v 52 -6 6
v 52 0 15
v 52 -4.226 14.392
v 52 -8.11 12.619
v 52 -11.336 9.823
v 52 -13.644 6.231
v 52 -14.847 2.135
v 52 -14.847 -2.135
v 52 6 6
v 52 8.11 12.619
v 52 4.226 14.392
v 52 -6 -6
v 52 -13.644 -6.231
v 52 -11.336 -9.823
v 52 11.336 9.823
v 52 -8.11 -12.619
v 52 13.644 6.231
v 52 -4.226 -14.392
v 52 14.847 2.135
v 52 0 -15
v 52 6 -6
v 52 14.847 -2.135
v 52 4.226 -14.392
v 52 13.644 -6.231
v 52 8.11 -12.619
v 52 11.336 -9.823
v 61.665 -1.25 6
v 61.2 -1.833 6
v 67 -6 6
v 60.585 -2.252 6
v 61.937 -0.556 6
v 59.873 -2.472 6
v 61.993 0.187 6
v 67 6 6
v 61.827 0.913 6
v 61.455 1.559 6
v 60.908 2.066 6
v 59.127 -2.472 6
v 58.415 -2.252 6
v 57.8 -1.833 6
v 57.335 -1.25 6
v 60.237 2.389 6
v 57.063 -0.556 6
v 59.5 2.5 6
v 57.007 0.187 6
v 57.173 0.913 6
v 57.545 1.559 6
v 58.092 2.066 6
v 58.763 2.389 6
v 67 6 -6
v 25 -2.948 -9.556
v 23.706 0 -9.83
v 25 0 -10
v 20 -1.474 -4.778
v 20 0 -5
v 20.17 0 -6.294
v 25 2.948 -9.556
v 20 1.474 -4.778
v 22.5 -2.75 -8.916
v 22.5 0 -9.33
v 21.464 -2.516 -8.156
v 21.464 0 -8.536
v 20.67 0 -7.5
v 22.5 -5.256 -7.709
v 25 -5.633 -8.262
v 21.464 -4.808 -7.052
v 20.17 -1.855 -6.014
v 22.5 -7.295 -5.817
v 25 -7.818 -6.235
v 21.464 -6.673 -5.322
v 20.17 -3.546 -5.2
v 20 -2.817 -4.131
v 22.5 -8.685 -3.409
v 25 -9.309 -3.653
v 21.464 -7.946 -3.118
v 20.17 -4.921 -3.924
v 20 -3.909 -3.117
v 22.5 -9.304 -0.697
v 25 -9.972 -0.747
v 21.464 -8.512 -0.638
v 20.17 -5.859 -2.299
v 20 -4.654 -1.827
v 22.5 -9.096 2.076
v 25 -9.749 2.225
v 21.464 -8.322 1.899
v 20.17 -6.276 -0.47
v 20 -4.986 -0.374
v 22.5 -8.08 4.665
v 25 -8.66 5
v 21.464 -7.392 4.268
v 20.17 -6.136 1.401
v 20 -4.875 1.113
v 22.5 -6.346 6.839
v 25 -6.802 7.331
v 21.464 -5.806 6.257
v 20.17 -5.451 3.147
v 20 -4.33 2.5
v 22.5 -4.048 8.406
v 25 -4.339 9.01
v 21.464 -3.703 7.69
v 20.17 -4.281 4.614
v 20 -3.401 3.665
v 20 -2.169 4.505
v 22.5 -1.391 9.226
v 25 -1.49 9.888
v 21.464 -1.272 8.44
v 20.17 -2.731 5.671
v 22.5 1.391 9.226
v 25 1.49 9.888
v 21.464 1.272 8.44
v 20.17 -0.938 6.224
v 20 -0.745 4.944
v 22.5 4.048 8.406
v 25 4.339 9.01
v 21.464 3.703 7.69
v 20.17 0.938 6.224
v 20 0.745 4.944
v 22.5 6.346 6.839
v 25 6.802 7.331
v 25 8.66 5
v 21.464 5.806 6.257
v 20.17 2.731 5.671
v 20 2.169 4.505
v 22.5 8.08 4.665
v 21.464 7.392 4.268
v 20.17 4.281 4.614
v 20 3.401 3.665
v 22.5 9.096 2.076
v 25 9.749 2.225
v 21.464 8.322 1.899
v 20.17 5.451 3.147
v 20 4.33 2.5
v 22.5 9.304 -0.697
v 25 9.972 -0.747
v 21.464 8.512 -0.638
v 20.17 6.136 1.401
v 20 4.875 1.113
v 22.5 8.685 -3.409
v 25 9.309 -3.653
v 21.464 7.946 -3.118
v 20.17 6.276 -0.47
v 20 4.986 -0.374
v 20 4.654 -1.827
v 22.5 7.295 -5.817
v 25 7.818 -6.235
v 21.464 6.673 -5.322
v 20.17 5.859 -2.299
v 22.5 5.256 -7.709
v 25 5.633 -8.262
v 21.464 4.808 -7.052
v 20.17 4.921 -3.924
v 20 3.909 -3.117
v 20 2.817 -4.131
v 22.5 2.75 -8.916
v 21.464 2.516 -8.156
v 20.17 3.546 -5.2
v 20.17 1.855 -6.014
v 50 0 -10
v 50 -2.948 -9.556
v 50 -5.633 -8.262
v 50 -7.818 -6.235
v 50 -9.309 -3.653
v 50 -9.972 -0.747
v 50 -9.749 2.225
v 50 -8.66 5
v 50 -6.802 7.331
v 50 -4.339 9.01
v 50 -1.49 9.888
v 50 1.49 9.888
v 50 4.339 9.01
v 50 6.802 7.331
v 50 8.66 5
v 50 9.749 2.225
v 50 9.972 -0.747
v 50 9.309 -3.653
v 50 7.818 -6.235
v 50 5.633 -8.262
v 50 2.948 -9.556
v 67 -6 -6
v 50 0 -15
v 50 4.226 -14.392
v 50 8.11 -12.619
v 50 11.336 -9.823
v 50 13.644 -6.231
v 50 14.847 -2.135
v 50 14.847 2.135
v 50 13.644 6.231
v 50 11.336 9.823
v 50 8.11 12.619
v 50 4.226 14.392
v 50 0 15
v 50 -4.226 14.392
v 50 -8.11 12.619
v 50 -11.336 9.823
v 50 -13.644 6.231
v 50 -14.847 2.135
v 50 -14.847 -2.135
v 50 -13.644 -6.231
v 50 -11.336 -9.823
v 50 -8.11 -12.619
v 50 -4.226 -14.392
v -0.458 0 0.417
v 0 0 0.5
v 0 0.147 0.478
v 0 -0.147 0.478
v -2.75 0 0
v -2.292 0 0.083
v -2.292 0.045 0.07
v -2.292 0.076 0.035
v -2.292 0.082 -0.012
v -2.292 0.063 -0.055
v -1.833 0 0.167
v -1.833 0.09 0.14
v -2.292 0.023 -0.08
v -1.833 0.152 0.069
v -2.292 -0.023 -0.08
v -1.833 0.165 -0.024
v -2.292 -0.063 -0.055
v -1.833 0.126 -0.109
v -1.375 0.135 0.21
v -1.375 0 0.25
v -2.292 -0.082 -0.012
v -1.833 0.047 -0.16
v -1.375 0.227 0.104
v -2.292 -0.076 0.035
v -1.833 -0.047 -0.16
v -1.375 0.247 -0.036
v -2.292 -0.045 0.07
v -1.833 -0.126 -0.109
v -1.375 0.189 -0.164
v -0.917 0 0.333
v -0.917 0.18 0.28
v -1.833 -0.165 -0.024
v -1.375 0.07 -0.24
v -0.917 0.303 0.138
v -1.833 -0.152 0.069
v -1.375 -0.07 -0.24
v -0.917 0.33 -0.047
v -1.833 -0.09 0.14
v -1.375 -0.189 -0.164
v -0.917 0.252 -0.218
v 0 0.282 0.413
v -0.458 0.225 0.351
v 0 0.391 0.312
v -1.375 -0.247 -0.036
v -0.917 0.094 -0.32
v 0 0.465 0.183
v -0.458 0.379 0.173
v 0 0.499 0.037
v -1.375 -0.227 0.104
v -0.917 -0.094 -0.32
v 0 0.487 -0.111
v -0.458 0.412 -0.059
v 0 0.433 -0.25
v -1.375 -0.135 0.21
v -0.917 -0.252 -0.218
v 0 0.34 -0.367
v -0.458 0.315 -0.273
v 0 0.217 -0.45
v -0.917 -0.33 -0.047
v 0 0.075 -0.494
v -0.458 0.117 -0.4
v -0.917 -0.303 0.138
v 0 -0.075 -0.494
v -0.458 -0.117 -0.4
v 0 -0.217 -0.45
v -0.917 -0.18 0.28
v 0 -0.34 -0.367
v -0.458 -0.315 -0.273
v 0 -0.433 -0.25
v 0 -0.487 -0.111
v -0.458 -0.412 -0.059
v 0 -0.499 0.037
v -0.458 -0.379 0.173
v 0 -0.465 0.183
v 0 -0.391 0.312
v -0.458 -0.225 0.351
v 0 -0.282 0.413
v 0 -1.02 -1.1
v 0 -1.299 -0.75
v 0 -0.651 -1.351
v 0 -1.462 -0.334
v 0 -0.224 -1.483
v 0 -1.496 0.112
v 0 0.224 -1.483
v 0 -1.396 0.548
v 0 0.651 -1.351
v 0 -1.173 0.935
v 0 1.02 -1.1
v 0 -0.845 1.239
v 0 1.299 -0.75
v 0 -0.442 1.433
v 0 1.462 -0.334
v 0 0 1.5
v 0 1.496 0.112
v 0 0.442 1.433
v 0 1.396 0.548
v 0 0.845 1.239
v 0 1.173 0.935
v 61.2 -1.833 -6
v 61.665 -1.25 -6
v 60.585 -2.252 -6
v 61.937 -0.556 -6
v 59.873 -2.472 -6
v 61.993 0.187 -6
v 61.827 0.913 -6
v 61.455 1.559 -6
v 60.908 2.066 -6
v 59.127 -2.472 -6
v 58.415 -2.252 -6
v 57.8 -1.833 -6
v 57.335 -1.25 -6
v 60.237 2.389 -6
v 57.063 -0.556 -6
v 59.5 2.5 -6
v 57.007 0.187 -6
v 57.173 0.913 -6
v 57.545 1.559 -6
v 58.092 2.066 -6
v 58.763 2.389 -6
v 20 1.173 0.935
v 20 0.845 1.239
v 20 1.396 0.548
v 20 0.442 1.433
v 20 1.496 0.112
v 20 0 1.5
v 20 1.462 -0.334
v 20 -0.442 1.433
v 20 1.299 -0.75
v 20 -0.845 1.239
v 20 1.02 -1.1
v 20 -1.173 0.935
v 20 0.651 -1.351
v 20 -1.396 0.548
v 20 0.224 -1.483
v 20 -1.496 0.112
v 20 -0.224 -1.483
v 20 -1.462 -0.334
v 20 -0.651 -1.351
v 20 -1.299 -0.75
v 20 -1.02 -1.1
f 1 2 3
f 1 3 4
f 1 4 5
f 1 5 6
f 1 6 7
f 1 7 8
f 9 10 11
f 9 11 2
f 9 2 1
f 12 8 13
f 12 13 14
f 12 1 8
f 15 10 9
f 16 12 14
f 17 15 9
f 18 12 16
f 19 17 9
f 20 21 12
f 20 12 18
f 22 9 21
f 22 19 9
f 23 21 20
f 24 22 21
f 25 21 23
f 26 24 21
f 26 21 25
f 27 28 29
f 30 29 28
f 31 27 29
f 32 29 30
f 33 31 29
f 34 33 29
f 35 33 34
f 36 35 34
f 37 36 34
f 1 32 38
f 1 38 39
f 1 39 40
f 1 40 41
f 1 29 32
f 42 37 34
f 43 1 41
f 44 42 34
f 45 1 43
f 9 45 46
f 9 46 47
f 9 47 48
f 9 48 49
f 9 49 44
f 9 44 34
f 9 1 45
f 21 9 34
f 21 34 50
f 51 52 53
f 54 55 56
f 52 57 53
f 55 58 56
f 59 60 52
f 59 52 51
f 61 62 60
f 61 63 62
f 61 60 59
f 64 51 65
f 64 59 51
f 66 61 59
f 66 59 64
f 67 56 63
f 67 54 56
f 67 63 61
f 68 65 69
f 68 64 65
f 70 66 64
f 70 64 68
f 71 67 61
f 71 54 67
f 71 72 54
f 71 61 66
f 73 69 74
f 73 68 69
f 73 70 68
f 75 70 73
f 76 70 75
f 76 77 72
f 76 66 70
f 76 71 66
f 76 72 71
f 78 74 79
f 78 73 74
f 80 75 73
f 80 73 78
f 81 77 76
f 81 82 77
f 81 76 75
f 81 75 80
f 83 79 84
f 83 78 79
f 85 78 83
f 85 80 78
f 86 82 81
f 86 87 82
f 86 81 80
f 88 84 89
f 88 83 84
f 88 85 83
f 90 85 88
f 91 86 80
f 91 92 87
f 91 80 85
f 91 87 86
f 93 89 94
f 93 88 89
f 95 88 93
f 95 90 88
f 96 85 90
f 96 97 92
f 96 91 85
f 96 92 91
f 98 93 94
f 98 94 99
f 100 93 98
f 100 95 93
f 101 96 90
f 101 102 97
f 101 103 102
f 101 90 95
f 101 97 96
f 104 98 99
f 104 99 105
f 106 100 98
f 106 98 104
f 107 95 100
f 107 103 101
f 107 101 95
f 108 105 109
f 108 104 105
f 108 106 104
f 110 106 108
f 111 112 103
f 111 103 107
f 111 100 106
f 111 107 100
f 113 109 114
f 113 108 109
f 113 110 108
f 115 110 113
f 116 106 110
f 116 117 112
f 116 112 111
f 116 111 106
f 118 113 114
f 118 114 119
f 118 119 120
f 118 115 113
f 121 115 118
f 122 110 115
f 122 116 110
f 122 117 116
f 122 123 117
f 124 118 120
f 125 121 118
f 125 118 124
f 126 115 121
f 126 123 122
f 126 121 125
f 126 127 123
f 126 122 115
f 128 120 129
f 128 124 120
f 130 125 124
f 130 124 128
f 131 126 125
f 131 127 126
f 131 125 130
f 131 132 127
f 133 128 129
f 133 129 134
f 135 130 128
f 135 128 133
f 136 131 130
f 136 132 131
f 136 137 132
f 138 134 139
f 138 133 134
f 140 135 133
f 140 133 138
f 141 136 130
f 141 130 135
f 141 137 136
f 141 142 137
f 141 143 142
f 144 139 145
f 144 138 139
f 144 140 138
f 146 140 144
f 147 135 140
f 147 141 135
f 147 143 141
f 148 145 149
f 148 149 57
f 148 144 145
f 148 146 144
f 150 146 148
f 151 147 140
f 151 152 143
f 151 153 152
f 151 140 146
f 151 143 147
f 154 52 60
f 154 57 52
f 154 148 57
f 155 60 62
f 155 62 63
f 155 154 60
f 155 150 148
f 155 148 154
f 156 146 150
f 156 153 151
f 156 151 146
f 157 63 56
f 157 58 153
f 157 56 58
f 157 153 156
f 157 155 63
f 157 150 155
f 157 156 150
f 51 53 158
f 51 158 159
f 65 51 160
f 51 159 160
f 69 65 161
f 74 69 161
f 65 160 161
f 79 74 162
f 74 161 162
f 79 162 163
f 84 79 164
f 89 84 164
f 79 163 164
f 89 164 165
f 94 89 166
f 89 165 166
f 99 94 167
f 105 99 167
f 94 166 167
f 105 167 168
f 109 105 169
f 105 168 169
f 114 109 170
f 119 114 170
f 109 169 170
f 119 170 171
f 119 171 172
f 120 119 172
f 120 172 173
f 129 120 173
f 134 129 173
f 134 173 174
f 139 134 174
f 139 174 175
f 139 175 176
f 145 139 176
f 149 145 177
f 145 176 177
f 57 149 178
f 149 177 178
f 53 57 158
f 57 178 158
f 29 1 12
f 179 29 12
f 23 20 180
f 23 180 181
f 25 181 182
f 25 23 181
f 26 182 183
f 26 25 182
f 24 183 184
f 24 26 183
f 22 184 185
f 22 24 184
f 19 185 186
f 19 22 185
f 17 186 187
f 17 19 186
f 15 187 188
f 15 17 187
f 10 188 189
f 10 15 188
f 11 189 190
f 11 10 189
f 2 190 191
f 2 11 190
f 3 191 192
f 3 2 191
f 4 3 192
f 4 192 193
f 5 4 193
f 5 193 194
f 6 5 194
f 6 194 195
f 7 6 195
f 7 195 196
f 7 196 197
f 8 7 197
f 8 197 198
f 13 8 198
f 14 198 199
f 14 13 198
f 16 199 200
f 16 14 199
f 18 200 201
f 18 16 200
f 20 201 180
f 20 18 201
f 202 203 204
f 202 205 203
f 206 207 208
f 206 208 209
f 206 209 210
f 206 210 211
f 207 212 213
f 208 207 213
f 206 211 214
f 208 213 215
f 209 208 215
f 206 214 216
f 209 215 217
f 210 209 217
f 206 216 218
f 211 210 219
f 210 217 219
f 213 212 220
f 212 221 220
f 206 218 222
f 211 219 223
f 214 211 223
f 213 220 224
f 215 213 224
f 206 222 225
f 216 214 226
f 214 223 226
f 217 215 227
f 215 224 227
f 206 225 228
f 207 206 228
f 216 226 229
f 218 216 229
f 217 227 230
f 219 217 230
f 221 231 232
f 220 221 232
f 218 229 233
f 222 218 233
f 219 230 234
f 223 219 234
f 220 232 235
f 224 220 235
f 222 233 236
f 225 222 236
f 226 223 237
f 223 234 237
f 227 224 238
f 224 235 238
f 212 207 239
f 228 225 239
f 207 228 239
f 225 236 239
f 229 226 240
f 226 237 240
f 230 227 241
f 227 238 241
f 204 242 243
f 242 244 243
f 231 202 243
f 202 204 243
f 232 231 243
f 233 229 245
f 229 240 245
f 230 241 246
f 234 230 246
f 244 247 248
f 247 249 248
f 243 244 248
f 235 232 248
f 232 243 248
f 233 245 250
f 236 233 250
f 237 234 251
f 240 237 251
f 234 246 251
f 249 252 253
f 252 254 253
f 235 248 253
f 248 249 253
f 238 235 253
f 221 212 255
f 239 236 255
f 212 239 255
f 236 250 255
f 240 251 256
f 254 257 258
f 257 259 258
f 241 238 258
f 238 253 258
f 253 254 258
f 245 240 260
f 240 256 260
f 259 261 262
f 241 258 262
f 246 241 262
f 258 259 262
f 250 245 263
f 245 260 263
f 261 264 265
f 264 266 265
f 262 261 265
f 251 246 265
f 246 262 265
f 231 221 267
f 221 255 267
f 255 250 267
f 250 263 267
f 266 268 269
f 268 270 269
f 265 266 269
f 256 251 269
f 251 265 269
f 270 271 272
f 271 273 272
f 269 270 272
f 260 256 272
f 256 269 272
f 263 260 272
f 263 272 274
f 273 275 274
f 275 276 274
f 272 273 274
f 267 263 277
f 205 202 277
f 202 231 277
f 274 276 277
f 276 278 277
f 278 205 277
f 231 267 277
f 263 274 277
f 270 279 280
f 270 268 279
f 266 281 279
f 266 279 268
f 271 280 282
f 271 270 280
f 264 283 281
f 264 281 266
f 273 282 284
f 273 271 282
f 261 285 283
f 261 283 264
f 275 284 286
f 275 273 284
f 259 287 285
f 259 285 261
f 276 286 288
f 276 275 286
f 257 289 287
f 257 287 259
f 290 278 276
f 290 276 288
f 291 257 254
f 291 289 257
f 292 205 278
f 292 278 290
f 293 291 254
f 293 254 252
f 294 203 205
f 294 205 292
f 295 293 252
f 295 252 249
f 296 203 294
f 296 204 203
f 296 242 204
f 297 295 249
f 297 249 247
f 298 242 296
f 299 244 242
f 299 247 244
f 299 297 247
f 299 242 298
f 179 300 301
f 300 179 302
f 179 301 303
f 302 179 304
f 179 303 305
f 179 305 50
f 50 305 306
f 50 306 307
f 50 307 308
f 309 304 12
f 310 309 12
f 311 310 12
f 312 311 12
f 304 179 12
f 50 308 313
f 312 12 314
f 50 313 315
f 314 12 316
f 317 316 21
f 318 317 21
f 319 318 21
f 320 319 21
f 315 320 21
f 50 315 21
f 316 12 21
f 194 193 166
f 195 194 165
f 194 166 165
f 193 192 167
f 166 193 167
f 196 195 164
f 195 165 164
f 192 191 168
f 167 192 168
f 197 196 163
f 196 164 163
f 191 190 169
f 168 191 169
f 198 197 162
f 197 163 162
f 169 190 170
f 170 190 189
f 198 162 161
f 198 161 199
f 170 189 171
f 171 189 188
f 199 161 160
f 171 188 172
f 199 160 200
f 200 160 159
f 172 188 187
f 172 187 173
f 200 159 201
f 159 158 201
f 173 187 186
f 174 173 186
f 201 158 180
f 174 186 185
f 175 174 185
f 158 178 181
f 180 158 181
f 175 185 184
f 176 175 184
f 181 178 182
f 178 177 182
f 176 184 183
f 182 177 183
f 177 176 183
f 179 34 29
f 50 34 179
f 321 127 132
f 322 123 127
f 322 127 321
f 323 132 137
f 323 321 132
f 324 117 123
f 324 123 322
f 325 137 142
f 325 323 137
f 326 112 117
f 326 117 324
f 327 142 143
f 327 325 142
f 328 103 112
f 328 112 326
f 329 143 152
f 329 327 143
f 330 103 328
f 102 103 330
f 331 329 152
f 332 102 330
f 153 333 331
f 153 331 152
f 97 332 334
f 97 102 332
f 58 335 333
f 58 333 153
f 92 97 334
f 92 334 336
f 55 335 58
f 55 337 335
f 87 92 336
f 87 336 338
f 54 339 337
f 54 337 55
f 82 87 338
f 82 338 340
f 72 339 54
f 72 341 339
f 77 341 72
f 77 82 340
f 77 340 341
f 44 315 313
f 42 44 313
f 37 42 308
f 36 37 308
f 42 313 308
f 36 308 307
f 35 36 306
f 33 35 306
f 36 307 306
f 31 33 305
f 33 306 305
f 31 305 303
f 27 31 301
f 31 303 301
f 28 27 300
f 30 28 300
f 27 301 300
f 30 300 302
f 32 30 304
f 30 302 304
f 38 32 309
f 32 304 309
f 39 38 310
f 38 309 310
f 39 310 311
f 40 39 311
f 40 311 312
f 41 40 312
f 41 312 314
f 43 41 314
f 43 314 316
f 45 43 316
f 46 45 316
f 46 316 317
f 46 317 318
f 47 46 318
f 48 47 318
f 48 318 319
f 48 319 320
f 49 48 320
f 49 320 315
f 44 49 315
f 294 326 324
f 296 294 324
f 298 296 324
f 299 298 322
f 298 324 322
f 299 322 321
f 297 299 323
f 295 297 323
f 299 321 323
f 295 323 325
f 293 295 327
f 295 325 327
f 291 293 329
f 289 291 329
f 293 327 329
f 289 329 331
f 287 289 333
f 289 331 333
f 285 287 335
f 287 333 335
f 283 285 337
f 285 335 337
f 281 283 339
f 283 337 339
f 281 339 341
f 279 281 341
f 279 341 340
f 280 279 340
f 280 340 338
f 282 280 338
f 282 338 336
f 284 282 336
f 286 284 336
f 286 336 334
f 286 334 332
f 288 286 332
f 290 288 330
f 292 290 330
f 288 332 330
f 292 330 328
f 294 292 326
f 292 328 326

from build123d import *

# Parameters (mm, degrees)
SKETCH1_R             = 15
BOSS_EXTRUDE1_DEPTH   = 2
SKETCH2_W             = 12
SKETCH2_H             = 12
BOSS_EXTRUDE2_DEPTH   = 15
SKETCH3_R             = 2.5
CUT_EXTRUDE1_DEPTH    = 30.849623113
SKETCH4_R             = 10
BOSS_EXTRUDE3_DEPTH   = 30
FILLET1_R             = 5
SKETCH5_R             = 1.5
BOSS_EXTRUDE4_DEPTH   = 20
SKETCH7_R             = 0.5
BODY_MOVE_COPY2_ANGLE = 90


with BuildPart() as part:
    # Sketch1 → Boss-Extrude1 (new body)
    with BuildSketch(Plane.XY):
        Circle(SKETCH1_R)
    extrude(amount=-BOSS_EXTRUDE1_DEPTH)

    # Sketch2 → Boss-Extrude2 (add)
    with BuildSketch(Plane.XY):
        Rectangle(SKETCH2_W, SKETCH2_H)
    extrude(amount=BOSS_EXTRUDE2_DEPTH)

    # Sketch3 → Cut-Extrude1 (cut, through all)
    with BuildSketch(Plane(origin=(6, 0, 0), x_dir=(0, 0, -1), z_dir=(1, 0, 0))):
        with Locations(Location((-7.5, 0, 0), (0, 0, 90))):
            Circle(SKETCH3_R)
    extrude(amount=-CUT_EXTRUDE1_DEPTH, mode=Mode.SUBTRACT)

    # Sketch4 → Boss-Extrude3 (add)
    with BuildSketch(Plane(origin=(0, 0, -2), x_dir=(-1, 0, 0), z_dir=(0, 0, -1))):
        with Locations(Location((0, 0, 0), (0, 0, 180))):
            Circle(SKETCH4_R)
    extrude(amount=BOSS_EXTRUDE3_DEPTH)

    # Fillet1
    fillet1_edges = [part.edges().sort_by_distance(p)[0] for p in [
        (-10, 0, -32),
    ]]
    fillet(fillet1_edges, radius=FILLET1_R)

    # Sketch5 → Boss-Extrude4 (add)
    with BuildSketch(Plane(origin=(0, 0, -32), x_dir=(-1, 0, 0), z_dir=(0, 0, -1))):
        Circle(SKETCH5_R)
    extrude(amount=BOSS_EXTRUDE4_DEPTH)

    # Sketch7 → Loft2 section 0
    with BuildSketch(Plane(origin=(0, 0, -52), x_dir=(-1, 0, 0), z_dir=(0, 0, -1)), mode=Mode.PRIVATE) as loft2_s0:
        Circle(SKETCH7_R)
    loft([Vertex(0, 0, -54.75), loft2_s0.sketch])


with BuildPart() as part_1:
    # Body-Move/Copy1: moved
    add(part.part.moved(Location((0, 0, 52))))


with BuildPart() as part_2:
    # Body-Move/Copy2: moved
    add(part_1.part.rotate(Axis((0, 0, 0), (0, 1, 0)), BODY_MOVE_COPY2_ANGLE))


solid = part_2.part
